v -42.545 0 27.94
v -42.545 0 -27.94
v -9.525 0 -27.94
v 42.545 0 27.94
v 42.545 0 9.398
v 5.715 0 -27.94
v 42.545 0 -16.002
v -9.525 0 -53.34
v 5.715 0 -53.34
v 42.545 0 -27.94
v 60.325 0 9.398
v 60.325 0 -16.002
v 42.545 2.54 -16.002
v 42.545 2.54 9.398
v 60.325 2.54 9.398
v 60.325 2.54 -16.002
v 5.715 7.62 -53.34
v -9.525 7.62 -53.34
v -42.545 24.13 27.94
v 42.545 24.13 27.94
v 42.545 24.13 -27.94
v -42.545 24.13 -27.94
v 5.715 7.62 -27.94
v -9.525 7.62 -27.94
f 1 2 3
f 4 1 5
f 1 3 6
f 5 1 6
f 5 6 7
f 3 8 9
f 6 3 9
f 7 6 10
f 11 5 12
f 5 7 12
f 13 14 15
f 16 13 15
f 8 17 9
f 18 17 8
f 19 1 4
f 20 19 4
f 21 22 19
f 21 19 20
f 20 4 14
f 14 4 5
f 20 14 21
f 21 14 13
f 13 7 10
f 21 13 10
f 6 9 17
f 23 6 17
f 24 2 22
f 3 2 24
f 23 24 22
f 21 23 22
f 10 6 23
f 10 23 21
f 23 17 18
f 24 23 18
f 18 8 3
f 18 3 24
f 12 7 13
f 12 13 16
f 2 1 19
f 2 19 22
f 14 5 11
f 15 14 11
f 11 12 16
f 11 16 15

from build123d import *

# Parameters (mm, degrees)
SKETCH1_W           = 85.09
SKETCH1_H           = 55.88
BOSS_EXTRUDE1_DEPTH = 24.13
SKETCH2_W           = 17.78
SKETCH2_H           = 25.4
BOSS_EXTRUDE2_DEPTH = 2.54
SKETCH3_W           = 15.24
SKETCH3_H           = 7.62
BOSS_EXTRUDE3_DEPTH = 25.4


with BuildPart() as part:
    # Sketch1 → Boss-Extrude1 (new body)
    with BuildSketch(Plane(origin=(0, 0, 0), x_dir=(1, 0, 0), z_dir=(0, 1, 0))):
        Rectangle(SKETCH1_W, SKETCH1_H)
    extrude(amount=BOSS_EXTRUDE1_DEPTH)

    # Sketch2 → Boss-Extrude2 (add)
    with BuildSketch(Plane.XZ):
        with Locations((51.435, -3.302)):
            Rectangle(SKETCH2_W, SKETCH2_H)
    extrude(amount=-BOSS_EXTRUDE2_DEPTH)

    # Sketch3 → Boss-Extrude3 (add)
    with BuildSketch(Plane(origin=(0, 0, -27.94), x_dir=(-1, 0, 0), z_dir=(0, 0, -1))):
        with Locations((1.905, 3.81)):
            Rectangle(SKETCH3_W, SKETCH3_H)
    extrude(amount=BOSS_EXTRUDE3_DEPTH)


solid = part.part
